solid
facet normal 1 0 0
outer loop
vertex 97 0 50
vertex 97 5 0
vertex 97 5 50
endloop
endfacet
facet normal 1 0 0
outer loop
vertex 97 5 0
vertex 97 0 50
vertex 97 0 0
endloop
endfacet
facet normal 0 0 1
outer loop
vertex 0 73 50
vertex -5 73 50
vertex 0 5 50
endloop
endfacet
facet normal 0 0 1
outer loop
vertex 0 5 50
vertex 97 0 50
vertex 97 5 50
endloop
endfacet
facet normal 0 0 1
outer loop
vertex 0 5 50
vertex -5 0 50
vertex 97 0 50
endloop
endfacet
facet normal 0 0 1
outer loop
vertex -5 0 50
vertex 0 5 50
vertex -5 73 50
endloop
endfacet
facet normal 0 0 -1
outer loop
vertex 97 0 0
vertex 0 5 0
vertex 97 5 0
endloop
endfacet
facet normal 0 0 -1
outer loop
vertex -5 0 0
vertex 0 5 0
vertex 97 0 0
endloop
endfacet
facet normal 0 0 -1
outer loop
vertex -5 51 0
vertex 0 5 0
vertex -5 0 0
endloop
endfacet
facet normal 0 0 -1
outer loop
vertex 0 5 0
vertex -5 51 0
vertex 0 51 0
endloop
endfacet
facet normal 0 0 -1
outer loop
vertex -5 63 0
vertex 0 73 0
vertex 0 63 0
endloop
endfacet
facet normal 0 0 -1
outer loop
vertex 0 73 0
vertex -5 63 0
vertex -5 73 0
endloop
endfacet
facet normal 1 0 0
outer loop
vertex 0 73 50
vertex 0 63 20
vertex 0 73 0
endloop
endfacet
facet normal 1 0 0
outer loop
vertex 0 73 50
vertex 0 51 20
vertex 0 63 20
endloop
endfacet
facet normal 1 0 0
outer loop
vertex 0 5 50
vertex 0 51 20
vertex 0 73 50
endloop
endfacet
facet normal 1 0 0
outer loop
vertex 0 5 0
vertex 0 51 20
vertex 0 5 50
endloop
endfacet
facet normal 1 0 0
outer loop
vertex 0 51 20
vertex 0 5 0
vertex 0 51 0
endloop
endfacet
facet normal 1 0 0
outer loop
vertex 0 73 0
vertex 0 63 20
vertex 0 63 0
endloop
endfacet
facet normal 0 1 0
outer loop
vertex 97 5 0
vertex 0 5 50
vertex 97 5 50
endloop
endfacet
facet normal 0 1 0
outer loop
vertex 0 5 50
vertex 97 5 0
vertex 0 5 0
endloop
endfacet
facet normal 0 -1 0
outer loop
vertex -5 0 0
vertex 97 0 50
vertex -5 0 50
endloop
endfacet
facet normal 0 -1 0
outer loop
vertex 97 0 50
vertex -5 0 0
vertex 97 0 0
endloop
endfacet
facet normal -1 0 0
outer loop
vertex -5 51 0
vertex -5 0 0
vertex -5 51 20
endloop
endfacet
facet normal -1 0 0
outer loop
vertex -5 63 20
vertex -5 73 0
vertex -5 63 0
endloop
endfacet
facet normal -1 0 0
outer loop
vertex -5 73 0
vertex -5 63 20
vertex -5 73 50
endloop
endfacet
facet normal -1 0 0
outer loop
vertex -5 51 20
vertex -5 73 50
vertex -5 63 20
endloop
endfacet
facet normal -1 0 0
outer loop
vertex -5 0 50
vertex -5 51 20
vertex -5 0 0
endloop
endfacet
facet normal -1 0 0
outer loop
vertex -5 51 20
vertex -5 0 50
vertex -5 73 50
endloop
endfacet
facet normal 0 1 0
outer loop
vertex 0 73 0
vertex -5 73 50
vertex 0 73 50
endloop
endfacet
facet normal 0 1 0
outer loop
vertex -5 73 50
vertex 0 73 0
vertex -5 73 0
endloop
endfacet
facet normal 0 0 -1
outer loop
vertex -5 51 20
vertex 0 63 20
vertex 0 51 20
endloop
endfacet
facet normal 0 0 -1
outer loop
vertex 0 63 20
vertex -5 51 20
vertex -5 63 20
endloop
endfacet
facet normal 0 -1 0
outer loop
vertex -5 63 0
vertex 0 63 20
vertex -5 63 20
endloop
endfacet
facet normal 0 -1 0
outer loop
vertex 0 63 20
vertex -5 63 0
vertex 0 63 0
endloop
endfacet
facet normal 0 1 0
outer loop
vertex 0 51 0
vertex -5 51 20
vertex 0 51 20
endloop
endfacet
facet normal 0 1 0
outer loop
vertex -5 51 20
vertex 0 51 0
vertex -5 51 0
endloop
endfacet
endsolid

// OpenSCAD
spessore=5; //da decidere se uguale per tutte oppure no
altezza=50; //uguale per tutte le pareti
lunghezza_uno=73; //lunghezza della prima parete
lunghezza_due = 97; //lunghezza della seconda parete

// la distanza della porta deve essere considerata in  relazione all'angolo tra le pareti
altezza_porta = 20; 
larghezza_porta = 12;
distanza_porta = 46;

//parametri relativi alle finestre
lunghezza_fin=15;
 altezza_fin=11;

due_pareti_porta();

module due_pareti(){
   
    cube([lunghezza_due, spessore, altezza]);
   rotate([0,0,90])    cube([lunghezza_uno, spessore, altezza]);
    
}


module due_pareti_porta(){
    
    difference(){
        due_pareti();
        translate([-spessore,distanza_porta+spessore,0]) cube([spessore,larghezza_porta,altezza_porta]);
         }
       
}

module finestra(){
    
    cube([lunghezza_fin, spessore, altezza_fin]);
    
    }
    
    
    
